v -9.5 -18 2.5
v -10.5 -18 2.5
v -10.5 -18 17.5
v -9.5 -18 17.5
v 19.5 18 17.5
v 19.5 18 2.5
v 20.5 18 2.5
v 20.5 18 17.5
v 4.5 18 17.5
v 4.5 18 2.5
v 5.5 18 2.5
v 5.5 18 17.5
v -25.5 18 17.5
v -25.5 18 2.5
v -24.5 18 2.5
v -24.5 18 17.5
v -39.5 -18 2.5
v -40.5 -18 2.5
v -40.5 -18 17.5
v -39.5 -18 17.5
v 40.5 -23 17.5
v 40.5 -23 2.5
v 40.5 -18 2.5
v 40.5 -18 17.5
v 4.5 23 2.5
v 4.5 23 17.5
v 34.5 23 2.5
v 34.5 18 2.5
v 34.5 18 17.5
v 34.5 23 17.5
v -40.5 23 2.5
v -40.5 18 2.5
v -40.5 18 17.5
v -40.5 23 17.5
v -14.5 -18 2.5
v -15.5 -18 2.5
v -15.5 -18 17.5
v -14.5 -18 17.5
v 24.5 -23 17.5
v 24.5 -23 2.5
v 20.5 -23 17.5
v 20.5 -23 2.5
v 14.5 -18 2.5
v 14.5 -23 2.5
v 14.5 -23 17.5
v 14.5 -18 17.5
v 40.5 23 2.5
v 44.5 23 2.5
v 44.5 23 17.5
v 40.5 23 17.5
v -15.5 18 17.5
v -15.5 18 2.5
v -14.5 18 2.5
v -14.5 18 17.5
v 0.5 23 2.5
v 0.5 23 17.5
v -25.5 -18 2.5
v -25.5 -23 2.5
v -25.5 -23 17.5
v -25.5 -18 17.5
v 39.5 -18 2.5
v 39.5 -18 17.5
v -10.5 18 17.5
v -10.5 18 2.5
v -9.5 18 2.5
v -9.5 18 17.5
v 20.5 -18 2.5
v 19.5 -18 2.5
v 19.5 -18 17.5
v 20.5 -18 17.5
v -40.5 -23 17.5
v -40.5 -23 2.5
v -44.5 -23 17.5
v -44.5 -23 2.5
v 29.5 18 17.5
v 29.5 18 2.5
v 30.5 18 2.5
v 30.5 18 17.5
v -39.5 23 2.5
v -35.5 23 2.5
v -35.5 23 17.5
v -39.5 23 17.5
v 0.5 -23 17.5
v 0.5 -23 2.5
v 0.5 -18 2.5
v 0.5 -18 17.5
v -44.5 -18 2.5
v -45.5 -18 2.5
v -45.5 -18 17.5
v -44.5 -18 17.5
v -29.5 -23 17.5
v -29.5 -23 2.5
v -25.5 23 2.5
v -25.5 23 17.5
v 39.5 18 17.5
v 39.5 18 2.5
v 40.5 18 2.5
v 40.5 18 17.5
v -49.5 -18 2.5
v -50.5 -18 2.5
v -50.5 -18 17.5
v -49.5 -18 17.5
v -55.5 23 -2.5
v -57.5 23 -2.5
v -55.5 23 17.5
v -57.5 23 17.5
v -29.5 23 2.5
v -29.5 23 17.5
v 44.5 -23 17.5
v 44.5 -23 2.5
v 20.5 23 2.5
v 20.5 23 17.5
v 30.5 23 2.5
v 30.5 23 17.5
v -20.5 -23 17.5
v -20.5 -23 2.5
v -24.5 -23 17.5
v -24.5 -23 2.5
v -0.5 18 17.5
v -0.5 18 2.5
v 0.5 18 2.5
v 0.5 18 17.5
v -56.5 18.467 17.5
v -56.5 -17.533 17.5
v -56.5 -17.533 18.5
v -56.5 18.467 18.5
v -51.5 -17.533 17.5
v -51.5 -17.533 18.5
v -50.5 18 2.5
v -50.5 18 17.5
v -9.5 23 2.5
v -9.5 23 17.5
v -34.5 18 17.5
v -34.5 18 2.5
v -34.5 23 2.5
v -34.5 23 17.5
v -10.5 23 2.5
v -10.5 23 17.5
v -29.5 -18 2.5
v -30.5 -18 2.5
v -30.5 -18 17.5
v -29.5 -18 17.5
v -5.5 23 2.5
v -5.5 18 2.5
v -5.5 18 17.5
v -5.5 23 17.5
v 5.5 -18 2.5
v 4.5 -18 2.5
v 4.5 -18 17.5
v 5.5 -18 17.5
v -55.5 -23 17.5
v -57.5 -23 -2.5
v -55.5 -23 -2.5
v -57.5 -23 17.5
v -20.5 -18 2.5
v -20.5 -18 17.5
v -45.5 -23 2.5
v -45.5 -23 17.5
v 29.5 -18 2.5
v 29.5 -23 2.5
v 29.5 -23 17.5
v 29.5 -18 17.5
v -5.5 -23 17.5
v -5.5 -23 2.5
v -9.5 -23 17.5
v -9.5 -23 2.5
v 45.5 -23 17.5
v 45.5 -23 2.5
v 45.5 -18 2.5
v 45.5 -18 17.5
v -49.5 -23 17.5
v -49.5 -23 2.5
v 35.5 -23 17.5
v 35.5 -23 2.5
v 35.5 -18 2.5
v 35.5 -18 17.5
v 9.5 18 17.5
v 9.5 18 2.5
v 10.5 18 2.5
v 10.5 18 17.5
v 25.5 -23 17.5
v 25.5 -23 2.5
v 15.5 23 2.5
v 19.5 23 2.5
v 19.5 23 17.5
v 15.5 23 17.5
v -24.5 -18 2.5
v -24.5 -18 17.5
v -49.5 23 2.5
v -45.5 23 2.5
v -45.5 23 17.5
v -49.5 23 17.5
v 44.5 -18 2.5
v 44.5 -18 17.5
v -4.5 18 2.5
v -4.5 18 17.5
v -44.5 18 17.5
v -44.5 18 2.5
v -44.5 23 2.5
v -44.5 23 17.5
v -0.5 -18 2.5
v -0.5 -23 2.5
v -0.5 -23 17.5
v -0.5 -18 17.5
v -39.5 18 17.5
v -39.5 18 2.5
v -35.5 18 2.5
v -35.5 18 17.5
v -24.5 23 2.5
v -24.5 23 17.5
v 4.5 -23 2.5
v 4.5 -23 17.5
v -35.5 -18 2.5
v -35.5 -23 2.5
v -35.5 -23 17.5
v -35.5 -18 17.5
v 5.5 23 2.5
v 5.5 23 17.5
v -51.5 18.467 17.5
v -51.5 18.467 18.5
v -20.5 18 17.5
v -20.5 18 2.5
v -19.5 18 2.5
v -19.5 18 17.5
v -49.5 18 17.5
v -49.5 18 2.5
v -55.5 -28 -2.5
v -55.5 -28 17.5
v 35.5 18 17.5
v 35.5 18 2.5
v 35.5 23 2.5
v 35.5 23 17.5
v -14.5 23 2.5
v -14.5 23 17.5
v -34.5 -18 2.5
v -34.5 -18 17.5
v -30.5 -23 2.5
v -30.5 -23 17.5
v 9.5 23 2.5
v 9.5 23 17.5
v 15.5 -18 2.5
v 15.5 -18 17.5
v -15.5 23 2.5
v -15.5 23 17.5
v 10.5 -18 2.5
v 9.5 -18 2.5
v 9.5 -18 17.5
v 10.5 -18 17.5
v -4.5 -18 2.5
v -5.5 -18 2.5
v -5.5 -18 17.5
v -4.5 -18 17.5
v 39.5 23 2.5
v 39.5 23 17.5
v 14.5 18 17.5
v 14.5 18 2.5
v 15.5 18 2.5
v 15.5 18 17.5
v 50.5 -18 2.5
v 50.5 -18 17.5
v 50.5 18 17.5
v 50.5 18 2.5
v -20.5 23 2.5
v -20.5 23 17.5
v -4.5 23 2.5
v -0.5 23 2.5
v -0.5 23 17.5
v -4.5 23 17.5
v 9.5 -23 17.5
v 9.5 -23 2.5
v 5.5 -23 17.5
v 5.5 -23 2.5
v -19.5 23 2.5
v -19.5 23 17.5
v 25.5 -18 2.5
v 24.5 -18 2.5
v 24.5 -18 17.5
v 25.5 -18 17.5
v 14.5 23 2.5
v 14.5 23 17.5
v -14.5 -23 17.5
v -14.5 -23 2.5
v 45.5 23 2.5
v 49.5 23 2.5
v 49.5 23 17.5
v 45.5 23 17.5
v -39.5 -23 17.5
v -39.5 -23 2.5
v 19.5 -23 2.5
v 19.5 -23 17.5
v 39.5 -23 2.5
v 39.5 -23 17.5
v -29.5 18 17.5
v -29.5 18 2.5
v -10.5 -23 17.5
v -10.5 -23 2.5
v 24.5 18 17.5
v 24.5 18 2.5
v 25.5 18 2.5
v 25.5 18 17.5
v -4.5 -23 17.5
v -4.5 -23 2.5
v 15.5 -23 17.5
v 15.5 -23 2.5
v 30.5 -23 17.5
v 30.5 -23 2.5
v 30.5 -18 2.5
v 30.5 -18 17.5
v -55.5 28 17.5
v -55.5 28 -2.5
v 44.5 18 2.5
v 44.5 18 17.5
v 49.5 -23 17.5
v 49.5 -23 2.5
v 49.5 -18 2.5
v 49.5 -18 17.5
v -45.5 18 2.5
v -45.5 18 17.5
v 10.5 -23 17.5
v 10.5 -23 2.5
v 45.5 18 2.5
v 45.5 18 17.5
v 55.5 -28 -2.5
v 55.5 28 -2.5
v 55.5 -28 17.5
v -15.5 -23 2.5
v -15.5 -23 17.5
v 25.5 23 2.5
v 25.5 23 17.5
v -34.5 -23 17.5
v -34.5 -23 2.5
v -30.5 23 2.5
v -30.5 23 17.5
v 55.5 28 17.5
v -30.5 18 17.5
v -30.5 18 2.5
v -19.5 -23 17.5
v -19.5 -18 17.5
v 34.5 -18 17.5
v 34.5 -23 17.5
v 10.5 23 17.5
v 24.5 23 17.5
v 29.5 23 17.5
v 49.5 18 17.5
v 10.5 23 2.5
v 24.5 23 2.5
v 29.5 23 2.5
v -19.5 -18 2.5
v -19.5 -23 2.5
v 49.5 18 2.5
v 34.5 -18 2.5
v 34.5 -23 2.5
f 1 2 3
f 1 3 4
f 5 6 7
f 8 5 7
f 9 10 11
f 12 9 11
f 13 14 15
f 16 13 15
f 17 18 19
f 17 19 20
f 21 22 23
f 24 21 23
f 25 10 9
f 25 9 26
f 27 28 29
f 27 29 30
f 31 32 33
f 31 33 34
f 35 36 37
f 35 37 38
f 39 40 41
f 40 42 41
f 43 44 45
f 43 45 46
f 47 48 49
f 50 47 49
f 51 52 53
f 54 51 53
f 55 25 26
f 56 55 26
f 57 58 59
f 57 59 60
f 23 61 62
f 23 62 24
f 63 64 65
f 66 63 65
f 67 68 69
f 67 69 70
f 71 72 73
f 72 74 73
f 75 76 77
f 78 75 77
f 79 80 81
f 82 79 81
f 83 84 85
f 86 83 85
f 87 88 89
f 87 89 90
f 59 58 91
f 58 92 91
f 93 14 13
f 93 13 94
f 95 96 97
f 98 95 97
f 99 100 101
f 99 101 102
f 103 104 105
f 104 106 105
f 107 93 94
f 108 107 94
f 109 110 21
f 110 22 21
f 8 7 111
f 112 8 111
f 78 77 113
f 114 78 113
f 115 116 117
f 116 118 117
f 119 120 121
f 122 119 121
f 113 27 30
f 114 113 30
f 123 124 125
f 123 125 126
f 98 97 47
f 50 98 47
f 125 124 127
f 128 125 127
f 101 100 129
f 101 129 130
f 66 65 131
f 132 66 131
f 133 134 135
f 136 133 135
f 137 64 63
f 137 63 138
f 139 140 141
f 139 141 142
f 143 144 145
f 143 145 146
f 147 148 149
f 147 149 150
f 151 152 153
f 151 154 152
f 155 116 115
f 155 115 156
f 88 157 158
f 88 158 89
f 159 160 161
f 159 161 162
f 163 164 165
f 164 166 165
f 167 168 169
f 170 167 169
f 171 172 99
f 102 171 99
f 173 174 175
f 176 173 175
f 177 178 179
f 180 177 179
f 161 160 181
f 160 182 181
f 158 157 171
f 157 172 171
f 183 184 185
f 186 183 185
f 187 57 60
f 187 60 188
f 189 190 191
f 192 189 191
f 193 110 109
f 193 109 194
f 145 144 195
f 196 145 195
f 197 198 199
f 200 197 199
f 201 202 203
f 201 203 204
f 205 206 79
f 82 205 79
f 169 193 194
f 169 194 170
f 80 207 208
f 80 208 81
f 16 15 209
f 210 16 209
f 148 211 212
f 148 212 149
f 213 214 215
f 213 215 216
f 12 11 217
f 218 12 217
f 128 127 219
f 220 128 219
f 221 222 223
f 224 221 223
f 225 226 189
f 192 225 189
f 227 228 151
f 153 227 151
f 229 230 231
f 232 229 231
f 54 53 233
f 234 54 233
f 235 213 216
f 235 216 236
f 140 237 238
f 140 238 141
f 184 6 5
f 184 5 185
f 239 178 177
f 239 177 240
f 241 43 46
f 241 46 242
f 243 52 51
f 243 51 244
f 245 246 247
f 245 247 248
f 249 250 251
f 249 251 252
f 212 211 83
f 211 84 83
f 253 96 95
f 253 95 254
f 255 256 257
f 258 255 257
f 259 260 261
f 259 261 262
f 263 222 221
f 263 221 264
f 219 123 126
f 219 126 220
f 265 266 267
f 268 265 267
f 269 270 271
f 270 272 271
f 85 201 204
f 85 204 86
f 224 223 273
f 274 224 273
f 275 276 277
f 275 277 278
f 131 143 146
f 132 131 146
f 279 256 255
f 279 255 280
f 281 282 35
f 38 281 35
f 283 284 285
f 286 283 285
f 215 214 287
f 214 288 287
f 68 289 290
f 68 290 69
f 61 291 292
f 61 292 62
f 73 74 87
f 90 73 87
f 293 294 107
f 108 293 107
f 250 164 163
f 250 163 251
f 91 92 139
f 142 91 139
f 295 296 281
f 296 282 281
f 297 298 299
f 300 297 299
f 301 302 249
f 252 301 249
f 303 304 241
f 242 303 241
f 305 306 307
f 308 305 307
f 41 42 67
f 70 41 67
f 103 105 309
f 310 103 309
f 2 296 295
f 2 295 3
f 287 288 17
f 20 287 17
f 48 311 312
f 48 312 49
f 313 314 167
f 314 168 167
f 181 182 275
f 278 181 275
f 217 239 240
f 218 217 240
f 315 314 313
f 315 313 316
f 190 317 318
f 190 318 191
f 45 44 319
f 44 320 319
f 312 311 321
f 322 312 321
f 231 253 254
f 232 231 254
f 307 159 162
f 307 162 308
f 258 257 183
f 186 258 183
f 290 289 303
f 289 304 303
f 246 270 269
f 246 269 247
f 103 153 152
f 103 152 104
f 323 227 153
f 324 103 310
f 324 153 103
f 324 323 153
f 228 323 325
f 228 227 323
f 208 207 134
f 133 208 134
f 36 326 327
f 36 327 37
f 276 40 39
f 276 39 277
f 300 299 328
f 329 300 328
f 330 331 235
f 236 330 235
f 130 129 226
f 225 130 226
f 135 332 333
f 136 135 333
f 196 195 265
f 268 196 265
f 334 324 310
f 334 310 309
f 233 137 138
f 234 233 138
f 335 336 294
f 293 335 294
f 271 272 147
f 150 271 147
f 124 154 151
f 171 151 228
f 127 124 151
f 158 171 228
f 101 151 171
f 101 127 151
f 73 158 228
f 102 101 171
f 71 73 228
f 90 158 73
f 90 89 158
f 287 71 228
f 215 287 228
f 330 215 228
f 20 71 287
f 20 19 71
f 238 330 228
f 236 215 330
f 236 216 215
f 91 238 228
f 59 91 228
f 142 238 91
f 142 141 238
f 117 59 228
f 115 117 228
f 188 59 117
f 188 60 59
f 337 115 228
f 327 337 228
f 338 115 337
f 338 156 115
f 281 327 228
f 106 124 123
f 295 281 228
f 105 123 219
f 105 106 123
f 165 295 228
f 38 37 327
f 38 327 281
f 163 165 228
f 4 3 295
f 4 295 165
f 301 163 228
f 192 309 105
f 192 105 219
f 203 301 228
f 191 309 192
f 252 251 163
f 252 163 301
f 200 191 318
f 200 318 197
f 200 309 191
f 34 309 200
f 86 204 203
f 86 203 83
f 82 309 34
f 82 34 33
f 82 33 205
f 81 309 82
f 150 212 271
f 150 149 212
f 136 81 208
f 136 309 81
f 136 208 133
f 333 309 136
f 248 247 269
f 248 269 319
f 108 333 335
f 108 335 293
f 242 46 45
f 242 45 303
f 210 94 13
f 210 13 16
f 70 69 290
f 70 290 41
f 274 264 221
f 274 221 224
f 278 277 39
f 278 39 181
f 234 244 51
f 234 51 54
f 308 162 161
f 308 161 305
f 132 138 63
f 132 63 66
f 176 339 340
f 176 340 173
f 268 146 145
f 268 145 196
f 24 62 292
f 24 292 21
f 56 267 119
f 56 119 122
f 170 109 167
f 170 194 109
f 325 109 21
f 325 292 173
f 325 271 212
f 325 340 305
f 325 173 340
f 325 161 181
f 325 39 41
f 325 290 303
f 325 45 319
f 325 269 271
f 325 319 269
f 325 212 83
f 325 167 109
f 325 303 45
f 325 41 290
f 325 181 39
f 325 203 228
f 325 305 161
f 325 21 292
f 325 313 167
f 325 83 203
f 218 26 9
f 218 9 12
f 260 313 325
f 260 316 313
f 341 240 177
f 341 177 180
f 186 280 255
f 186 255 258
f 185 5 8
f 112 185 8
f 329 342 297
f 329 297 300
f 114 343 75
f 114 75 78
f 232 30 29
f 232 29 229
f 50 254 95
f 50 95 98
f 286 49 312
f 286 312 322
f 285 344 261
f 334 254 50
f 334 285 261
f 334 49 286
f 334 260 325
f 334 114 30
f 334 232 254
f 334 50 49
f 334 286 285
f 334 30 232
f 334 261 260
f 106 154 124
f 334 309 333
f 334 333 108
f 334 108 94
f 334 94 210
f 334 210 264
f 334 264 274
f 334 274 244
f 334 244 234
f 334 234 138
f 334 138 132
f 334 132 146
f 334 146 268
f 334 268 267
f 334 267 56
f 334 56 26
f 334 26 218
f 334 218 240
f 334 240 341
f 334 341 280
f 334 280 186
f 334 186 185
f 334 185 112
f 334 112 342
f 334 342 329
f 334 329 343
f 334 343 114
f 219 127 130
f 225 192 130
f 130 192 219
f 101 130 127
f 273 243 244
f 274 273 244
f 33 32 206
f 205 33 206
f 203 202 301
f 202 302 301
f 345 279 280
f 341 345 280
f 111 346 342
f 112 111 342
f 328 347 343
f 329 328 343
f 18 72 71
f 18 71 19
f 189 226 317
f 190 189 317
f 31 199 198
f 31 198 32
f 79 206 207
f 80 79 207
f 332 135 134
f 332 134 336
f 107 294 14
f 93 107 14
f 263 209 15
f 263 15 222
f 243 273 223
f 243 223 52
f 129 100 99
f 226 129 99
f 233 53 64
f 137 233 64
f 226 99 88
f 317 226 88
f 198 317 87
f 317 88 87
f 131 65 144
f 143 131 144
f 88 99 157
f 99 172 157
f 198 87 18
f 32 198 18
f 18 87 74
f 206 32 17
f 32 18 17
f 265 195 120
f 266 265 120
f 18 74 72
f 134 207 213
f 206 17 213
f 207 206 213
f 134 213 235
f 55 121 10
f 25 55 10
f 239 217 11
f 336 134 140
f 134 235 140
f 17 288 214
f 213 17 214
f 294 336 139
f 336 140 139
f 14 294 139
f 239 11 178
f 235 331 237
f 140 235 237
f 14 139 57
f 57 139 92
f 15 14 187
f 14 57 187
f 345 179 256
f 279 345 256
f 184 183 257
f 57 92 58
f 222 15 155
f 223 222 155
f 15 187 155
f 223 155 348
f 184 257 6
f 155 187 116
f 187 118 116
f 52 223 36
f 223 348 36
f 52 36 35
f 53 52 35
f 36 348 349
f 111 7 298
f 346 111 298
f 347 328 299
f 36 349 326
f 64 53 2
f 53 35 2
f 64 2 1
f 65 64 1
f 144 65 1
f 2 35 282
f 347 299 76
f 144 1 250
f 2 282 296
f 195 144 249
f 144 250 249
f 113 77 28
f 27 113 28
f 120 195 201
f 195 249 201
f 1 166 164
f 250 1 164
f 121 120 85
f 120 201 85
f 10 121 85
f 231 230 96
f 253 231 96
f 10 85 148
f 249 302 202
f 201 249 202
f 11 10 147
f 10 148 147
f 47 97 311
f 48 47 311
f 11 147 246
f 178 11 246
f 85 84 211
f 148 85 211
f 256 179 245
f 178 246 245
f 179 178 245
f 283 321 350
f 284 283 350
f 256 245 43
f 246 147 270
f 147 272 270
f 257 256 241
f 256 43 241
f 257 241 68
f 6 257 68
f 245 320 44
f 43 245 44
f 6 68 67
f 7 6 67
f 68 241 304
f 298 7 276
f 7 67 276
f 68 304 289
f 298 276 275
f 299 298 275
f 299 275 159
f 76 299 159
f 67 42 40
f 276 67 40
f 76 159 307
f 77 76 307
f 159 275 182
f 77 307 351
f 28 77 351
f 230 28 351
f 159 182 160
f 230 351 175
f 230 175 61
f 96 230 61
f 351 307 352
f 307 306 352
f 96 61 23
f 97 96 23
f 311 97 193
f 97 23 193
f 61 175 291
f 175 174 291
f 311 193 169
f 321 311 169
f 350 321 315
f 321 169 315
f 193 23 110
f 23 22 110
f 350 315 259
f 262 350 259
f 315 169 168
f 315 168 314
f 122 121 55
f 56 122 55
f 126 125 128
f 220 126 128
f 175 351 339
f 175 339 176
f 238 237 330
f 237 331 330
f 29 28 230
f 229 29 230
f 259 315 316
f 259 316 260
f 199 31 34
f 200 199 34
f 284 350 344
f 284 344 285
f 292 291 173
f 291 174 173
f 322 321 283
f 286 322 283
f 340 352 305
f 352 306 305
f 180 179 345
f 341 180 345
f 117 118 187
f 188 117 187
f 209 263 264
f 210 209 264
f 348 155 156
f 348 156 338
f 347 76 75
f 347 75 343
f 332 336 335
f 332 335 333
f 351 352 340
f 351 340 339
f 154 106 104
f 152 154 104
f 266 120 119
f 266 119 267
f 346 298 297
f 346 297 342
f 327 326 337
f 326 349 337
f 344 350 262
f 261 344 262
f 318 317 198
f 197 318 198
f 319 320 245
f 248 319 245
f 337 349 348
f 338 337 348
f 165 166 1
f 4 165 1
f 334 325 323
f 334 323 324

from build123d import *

# Parameters (mm, degrees)
F2_W     = 101
F2_H     = 5
F3_DEPTH = 23
F4_W     = 5
F4_H     = 20
F5_DEPTH = 55.5
F1_W     = 1
F1_H     = 5
F6_DEPTH = 17.5
F7_W     = 5
F7_H     = 36
F8_DEPTH = 18.5


with BuildPart() as f3:
    # F2 (on Front) → F3 (new body, symmetric)
    with BuildSketch(Plane.XZ):
        Rectangle(F2_W, F2_H)
        Polygon((50.5, 17.5), (50.5, 2.5), (50.5, -2.5), (55.5, -2.5), (55.5, 17.5), align=None)
        Polygon((-50.5, -2.5), (-50.5, 2.5), (-50.5, 17.5), (-57.5, 17.5), (-57.5, -2.5), align=None)
    extrude(amount=F3_DEPTH, both=True)

    # F4 (on Right) → F5 (join, symmetric)
    with BuildSketch(Plane.YZ):
        with Locations((-25.5, 7.5)):
            Rectangle(F4_W, F4_H)
        with Locations((25.5, 7.5)):
            Rectangle(F4_W, F4_H)
    extrude(amount=F5_DEPTH, both=True)

    # F1 (on Top) → F6 (join)
    with BuildSketch(Plane.XY):
        with Locations((-50, 20.5)):
            Rectangle(F1_W, F1_H)
        with Locations((-45, 20.5)):
            Rectangle(F1_W, F1_H)
        with Locations((-40, 20.5)):
            Rectangle(F1_W, F1_H)
        with Locations((-35, 20.5)):
            Rectangle(F1_W, F1_H)
        with Locations((-30, 20.5)):
            Rectangle(F1_W, F1_H)
        with Locations((-25, 20.5)):
            Rectangle(F1_W, F1_H)
        with Locations((-20, 20.5)):
            Rectangle(F1_W, F1_H)
        with Locations((-15, 20.5)):
            Rectangle(F1_W, F1_H)
        with Locations((-10, 20.5)):
            Rectangle(F1_W, F1_H)
        with Locations((-5, 20.5)):
            Rectangle(F1_W, F1_H)
        with Locations((0, 20.5)):
            Rectangle(F1_W, F1_H)
        with Locations((5, 20.5)):
            Rectangle(F1_W, F1_H)
        with Locations((10, 20.5)):
            Rectangle(F1_W, F1_H)
        with Locations((15, 20.5)):
            Rectangle(F1_W, F1_H)
        with Locations((20, 20.5)):
            Rectangle(F1_W, F1_H)
        with Locations((25, 20.5)):
            Rectangle(F1_W, F1_H)
        with Locations((30, 20.5)):
            Rectangle(F1_W, F1_H)
        with Locations((35, 20.5)):
            Rectangle(F1_W, F1_H)
        with Locations((40, 20.5)):
            Rectangle(F1_W, F1_H)
        with Locations((45, 20.5)):
            Rectangle(F1_W, F1_H)
        with Locations((50, 20.5)):
            Rectangle(F1_W, F1_H)
        with Locations((-50, -20.5)):
            Rectangle(F1_W, F1_H)
        with Locations((50, -20.5)):
            Rectangle(F1_W, F1_H)
        with Locations((-45, -20.5)):
            Rectangle(F1_W, F1_H)
        with Locations((0, -20.5)):
            Rectangle(F1_W, F1_H)
        with Locations((20, -20.5)):
            Rectangle(F1_W, F1_H)
        with Locations((40, -20.5)):
            Rectangle(F1_W, F1_H)
        with Locations((-20, -20.5)):
            Rectangle(F1_W, F1_H)
        with Locations((30, -20.5)):
            Rectangle(F1_W, F1_H)
        with Locations((-35, -20.5)):
            Rectangle(F1_W, F1_H)
        with Locations((-30, -20.5)):
            Rectangle(F1_W, F1_H)
        with Locations((-10, -20.5)):
            Rectangle(F1_W, F1_H)
        with Locations((10, -20.5)):
            Rectangle(F1_W, F1_H)
        with Locations((-40, -20.5)):
            Rectangle(F1_W, F1_H)
        with Locations((35, -20.5)):
            Rectangle(F1_W, F1_H)
        with Locations((-25, -20.5)):
            Rectangle(F1_W, F1_H)
        with Locations((-5, -20.5)):
            Rectangle(F1_W, F1_H)
        with Locations((15, -20.5)):
            Rectangle(F1_W, F1_H)
        with Locations((5, -20.5)):
            Rectangle(F1_W, F1_H)
        with Locations((25, -20.5)):
            Rectangle(F1_W, F1_H)
        with Locations((45, -20.5)):
            Rectangle(F1_W, F1_H)
        with Locations((-15, -20.5)):
            Rectangle(F1_W, F1_H)
    extrude(amount=F6_DEPTH)

    # F7 (on Top) → F8 (join)
    with BuildSketch(Plane.XY):
        with Locations((-54, 0.467316)):
            Rectangle(F7_W, F7_H)
    extrude(amount=F8_DEPTH)


solid = f3.part
